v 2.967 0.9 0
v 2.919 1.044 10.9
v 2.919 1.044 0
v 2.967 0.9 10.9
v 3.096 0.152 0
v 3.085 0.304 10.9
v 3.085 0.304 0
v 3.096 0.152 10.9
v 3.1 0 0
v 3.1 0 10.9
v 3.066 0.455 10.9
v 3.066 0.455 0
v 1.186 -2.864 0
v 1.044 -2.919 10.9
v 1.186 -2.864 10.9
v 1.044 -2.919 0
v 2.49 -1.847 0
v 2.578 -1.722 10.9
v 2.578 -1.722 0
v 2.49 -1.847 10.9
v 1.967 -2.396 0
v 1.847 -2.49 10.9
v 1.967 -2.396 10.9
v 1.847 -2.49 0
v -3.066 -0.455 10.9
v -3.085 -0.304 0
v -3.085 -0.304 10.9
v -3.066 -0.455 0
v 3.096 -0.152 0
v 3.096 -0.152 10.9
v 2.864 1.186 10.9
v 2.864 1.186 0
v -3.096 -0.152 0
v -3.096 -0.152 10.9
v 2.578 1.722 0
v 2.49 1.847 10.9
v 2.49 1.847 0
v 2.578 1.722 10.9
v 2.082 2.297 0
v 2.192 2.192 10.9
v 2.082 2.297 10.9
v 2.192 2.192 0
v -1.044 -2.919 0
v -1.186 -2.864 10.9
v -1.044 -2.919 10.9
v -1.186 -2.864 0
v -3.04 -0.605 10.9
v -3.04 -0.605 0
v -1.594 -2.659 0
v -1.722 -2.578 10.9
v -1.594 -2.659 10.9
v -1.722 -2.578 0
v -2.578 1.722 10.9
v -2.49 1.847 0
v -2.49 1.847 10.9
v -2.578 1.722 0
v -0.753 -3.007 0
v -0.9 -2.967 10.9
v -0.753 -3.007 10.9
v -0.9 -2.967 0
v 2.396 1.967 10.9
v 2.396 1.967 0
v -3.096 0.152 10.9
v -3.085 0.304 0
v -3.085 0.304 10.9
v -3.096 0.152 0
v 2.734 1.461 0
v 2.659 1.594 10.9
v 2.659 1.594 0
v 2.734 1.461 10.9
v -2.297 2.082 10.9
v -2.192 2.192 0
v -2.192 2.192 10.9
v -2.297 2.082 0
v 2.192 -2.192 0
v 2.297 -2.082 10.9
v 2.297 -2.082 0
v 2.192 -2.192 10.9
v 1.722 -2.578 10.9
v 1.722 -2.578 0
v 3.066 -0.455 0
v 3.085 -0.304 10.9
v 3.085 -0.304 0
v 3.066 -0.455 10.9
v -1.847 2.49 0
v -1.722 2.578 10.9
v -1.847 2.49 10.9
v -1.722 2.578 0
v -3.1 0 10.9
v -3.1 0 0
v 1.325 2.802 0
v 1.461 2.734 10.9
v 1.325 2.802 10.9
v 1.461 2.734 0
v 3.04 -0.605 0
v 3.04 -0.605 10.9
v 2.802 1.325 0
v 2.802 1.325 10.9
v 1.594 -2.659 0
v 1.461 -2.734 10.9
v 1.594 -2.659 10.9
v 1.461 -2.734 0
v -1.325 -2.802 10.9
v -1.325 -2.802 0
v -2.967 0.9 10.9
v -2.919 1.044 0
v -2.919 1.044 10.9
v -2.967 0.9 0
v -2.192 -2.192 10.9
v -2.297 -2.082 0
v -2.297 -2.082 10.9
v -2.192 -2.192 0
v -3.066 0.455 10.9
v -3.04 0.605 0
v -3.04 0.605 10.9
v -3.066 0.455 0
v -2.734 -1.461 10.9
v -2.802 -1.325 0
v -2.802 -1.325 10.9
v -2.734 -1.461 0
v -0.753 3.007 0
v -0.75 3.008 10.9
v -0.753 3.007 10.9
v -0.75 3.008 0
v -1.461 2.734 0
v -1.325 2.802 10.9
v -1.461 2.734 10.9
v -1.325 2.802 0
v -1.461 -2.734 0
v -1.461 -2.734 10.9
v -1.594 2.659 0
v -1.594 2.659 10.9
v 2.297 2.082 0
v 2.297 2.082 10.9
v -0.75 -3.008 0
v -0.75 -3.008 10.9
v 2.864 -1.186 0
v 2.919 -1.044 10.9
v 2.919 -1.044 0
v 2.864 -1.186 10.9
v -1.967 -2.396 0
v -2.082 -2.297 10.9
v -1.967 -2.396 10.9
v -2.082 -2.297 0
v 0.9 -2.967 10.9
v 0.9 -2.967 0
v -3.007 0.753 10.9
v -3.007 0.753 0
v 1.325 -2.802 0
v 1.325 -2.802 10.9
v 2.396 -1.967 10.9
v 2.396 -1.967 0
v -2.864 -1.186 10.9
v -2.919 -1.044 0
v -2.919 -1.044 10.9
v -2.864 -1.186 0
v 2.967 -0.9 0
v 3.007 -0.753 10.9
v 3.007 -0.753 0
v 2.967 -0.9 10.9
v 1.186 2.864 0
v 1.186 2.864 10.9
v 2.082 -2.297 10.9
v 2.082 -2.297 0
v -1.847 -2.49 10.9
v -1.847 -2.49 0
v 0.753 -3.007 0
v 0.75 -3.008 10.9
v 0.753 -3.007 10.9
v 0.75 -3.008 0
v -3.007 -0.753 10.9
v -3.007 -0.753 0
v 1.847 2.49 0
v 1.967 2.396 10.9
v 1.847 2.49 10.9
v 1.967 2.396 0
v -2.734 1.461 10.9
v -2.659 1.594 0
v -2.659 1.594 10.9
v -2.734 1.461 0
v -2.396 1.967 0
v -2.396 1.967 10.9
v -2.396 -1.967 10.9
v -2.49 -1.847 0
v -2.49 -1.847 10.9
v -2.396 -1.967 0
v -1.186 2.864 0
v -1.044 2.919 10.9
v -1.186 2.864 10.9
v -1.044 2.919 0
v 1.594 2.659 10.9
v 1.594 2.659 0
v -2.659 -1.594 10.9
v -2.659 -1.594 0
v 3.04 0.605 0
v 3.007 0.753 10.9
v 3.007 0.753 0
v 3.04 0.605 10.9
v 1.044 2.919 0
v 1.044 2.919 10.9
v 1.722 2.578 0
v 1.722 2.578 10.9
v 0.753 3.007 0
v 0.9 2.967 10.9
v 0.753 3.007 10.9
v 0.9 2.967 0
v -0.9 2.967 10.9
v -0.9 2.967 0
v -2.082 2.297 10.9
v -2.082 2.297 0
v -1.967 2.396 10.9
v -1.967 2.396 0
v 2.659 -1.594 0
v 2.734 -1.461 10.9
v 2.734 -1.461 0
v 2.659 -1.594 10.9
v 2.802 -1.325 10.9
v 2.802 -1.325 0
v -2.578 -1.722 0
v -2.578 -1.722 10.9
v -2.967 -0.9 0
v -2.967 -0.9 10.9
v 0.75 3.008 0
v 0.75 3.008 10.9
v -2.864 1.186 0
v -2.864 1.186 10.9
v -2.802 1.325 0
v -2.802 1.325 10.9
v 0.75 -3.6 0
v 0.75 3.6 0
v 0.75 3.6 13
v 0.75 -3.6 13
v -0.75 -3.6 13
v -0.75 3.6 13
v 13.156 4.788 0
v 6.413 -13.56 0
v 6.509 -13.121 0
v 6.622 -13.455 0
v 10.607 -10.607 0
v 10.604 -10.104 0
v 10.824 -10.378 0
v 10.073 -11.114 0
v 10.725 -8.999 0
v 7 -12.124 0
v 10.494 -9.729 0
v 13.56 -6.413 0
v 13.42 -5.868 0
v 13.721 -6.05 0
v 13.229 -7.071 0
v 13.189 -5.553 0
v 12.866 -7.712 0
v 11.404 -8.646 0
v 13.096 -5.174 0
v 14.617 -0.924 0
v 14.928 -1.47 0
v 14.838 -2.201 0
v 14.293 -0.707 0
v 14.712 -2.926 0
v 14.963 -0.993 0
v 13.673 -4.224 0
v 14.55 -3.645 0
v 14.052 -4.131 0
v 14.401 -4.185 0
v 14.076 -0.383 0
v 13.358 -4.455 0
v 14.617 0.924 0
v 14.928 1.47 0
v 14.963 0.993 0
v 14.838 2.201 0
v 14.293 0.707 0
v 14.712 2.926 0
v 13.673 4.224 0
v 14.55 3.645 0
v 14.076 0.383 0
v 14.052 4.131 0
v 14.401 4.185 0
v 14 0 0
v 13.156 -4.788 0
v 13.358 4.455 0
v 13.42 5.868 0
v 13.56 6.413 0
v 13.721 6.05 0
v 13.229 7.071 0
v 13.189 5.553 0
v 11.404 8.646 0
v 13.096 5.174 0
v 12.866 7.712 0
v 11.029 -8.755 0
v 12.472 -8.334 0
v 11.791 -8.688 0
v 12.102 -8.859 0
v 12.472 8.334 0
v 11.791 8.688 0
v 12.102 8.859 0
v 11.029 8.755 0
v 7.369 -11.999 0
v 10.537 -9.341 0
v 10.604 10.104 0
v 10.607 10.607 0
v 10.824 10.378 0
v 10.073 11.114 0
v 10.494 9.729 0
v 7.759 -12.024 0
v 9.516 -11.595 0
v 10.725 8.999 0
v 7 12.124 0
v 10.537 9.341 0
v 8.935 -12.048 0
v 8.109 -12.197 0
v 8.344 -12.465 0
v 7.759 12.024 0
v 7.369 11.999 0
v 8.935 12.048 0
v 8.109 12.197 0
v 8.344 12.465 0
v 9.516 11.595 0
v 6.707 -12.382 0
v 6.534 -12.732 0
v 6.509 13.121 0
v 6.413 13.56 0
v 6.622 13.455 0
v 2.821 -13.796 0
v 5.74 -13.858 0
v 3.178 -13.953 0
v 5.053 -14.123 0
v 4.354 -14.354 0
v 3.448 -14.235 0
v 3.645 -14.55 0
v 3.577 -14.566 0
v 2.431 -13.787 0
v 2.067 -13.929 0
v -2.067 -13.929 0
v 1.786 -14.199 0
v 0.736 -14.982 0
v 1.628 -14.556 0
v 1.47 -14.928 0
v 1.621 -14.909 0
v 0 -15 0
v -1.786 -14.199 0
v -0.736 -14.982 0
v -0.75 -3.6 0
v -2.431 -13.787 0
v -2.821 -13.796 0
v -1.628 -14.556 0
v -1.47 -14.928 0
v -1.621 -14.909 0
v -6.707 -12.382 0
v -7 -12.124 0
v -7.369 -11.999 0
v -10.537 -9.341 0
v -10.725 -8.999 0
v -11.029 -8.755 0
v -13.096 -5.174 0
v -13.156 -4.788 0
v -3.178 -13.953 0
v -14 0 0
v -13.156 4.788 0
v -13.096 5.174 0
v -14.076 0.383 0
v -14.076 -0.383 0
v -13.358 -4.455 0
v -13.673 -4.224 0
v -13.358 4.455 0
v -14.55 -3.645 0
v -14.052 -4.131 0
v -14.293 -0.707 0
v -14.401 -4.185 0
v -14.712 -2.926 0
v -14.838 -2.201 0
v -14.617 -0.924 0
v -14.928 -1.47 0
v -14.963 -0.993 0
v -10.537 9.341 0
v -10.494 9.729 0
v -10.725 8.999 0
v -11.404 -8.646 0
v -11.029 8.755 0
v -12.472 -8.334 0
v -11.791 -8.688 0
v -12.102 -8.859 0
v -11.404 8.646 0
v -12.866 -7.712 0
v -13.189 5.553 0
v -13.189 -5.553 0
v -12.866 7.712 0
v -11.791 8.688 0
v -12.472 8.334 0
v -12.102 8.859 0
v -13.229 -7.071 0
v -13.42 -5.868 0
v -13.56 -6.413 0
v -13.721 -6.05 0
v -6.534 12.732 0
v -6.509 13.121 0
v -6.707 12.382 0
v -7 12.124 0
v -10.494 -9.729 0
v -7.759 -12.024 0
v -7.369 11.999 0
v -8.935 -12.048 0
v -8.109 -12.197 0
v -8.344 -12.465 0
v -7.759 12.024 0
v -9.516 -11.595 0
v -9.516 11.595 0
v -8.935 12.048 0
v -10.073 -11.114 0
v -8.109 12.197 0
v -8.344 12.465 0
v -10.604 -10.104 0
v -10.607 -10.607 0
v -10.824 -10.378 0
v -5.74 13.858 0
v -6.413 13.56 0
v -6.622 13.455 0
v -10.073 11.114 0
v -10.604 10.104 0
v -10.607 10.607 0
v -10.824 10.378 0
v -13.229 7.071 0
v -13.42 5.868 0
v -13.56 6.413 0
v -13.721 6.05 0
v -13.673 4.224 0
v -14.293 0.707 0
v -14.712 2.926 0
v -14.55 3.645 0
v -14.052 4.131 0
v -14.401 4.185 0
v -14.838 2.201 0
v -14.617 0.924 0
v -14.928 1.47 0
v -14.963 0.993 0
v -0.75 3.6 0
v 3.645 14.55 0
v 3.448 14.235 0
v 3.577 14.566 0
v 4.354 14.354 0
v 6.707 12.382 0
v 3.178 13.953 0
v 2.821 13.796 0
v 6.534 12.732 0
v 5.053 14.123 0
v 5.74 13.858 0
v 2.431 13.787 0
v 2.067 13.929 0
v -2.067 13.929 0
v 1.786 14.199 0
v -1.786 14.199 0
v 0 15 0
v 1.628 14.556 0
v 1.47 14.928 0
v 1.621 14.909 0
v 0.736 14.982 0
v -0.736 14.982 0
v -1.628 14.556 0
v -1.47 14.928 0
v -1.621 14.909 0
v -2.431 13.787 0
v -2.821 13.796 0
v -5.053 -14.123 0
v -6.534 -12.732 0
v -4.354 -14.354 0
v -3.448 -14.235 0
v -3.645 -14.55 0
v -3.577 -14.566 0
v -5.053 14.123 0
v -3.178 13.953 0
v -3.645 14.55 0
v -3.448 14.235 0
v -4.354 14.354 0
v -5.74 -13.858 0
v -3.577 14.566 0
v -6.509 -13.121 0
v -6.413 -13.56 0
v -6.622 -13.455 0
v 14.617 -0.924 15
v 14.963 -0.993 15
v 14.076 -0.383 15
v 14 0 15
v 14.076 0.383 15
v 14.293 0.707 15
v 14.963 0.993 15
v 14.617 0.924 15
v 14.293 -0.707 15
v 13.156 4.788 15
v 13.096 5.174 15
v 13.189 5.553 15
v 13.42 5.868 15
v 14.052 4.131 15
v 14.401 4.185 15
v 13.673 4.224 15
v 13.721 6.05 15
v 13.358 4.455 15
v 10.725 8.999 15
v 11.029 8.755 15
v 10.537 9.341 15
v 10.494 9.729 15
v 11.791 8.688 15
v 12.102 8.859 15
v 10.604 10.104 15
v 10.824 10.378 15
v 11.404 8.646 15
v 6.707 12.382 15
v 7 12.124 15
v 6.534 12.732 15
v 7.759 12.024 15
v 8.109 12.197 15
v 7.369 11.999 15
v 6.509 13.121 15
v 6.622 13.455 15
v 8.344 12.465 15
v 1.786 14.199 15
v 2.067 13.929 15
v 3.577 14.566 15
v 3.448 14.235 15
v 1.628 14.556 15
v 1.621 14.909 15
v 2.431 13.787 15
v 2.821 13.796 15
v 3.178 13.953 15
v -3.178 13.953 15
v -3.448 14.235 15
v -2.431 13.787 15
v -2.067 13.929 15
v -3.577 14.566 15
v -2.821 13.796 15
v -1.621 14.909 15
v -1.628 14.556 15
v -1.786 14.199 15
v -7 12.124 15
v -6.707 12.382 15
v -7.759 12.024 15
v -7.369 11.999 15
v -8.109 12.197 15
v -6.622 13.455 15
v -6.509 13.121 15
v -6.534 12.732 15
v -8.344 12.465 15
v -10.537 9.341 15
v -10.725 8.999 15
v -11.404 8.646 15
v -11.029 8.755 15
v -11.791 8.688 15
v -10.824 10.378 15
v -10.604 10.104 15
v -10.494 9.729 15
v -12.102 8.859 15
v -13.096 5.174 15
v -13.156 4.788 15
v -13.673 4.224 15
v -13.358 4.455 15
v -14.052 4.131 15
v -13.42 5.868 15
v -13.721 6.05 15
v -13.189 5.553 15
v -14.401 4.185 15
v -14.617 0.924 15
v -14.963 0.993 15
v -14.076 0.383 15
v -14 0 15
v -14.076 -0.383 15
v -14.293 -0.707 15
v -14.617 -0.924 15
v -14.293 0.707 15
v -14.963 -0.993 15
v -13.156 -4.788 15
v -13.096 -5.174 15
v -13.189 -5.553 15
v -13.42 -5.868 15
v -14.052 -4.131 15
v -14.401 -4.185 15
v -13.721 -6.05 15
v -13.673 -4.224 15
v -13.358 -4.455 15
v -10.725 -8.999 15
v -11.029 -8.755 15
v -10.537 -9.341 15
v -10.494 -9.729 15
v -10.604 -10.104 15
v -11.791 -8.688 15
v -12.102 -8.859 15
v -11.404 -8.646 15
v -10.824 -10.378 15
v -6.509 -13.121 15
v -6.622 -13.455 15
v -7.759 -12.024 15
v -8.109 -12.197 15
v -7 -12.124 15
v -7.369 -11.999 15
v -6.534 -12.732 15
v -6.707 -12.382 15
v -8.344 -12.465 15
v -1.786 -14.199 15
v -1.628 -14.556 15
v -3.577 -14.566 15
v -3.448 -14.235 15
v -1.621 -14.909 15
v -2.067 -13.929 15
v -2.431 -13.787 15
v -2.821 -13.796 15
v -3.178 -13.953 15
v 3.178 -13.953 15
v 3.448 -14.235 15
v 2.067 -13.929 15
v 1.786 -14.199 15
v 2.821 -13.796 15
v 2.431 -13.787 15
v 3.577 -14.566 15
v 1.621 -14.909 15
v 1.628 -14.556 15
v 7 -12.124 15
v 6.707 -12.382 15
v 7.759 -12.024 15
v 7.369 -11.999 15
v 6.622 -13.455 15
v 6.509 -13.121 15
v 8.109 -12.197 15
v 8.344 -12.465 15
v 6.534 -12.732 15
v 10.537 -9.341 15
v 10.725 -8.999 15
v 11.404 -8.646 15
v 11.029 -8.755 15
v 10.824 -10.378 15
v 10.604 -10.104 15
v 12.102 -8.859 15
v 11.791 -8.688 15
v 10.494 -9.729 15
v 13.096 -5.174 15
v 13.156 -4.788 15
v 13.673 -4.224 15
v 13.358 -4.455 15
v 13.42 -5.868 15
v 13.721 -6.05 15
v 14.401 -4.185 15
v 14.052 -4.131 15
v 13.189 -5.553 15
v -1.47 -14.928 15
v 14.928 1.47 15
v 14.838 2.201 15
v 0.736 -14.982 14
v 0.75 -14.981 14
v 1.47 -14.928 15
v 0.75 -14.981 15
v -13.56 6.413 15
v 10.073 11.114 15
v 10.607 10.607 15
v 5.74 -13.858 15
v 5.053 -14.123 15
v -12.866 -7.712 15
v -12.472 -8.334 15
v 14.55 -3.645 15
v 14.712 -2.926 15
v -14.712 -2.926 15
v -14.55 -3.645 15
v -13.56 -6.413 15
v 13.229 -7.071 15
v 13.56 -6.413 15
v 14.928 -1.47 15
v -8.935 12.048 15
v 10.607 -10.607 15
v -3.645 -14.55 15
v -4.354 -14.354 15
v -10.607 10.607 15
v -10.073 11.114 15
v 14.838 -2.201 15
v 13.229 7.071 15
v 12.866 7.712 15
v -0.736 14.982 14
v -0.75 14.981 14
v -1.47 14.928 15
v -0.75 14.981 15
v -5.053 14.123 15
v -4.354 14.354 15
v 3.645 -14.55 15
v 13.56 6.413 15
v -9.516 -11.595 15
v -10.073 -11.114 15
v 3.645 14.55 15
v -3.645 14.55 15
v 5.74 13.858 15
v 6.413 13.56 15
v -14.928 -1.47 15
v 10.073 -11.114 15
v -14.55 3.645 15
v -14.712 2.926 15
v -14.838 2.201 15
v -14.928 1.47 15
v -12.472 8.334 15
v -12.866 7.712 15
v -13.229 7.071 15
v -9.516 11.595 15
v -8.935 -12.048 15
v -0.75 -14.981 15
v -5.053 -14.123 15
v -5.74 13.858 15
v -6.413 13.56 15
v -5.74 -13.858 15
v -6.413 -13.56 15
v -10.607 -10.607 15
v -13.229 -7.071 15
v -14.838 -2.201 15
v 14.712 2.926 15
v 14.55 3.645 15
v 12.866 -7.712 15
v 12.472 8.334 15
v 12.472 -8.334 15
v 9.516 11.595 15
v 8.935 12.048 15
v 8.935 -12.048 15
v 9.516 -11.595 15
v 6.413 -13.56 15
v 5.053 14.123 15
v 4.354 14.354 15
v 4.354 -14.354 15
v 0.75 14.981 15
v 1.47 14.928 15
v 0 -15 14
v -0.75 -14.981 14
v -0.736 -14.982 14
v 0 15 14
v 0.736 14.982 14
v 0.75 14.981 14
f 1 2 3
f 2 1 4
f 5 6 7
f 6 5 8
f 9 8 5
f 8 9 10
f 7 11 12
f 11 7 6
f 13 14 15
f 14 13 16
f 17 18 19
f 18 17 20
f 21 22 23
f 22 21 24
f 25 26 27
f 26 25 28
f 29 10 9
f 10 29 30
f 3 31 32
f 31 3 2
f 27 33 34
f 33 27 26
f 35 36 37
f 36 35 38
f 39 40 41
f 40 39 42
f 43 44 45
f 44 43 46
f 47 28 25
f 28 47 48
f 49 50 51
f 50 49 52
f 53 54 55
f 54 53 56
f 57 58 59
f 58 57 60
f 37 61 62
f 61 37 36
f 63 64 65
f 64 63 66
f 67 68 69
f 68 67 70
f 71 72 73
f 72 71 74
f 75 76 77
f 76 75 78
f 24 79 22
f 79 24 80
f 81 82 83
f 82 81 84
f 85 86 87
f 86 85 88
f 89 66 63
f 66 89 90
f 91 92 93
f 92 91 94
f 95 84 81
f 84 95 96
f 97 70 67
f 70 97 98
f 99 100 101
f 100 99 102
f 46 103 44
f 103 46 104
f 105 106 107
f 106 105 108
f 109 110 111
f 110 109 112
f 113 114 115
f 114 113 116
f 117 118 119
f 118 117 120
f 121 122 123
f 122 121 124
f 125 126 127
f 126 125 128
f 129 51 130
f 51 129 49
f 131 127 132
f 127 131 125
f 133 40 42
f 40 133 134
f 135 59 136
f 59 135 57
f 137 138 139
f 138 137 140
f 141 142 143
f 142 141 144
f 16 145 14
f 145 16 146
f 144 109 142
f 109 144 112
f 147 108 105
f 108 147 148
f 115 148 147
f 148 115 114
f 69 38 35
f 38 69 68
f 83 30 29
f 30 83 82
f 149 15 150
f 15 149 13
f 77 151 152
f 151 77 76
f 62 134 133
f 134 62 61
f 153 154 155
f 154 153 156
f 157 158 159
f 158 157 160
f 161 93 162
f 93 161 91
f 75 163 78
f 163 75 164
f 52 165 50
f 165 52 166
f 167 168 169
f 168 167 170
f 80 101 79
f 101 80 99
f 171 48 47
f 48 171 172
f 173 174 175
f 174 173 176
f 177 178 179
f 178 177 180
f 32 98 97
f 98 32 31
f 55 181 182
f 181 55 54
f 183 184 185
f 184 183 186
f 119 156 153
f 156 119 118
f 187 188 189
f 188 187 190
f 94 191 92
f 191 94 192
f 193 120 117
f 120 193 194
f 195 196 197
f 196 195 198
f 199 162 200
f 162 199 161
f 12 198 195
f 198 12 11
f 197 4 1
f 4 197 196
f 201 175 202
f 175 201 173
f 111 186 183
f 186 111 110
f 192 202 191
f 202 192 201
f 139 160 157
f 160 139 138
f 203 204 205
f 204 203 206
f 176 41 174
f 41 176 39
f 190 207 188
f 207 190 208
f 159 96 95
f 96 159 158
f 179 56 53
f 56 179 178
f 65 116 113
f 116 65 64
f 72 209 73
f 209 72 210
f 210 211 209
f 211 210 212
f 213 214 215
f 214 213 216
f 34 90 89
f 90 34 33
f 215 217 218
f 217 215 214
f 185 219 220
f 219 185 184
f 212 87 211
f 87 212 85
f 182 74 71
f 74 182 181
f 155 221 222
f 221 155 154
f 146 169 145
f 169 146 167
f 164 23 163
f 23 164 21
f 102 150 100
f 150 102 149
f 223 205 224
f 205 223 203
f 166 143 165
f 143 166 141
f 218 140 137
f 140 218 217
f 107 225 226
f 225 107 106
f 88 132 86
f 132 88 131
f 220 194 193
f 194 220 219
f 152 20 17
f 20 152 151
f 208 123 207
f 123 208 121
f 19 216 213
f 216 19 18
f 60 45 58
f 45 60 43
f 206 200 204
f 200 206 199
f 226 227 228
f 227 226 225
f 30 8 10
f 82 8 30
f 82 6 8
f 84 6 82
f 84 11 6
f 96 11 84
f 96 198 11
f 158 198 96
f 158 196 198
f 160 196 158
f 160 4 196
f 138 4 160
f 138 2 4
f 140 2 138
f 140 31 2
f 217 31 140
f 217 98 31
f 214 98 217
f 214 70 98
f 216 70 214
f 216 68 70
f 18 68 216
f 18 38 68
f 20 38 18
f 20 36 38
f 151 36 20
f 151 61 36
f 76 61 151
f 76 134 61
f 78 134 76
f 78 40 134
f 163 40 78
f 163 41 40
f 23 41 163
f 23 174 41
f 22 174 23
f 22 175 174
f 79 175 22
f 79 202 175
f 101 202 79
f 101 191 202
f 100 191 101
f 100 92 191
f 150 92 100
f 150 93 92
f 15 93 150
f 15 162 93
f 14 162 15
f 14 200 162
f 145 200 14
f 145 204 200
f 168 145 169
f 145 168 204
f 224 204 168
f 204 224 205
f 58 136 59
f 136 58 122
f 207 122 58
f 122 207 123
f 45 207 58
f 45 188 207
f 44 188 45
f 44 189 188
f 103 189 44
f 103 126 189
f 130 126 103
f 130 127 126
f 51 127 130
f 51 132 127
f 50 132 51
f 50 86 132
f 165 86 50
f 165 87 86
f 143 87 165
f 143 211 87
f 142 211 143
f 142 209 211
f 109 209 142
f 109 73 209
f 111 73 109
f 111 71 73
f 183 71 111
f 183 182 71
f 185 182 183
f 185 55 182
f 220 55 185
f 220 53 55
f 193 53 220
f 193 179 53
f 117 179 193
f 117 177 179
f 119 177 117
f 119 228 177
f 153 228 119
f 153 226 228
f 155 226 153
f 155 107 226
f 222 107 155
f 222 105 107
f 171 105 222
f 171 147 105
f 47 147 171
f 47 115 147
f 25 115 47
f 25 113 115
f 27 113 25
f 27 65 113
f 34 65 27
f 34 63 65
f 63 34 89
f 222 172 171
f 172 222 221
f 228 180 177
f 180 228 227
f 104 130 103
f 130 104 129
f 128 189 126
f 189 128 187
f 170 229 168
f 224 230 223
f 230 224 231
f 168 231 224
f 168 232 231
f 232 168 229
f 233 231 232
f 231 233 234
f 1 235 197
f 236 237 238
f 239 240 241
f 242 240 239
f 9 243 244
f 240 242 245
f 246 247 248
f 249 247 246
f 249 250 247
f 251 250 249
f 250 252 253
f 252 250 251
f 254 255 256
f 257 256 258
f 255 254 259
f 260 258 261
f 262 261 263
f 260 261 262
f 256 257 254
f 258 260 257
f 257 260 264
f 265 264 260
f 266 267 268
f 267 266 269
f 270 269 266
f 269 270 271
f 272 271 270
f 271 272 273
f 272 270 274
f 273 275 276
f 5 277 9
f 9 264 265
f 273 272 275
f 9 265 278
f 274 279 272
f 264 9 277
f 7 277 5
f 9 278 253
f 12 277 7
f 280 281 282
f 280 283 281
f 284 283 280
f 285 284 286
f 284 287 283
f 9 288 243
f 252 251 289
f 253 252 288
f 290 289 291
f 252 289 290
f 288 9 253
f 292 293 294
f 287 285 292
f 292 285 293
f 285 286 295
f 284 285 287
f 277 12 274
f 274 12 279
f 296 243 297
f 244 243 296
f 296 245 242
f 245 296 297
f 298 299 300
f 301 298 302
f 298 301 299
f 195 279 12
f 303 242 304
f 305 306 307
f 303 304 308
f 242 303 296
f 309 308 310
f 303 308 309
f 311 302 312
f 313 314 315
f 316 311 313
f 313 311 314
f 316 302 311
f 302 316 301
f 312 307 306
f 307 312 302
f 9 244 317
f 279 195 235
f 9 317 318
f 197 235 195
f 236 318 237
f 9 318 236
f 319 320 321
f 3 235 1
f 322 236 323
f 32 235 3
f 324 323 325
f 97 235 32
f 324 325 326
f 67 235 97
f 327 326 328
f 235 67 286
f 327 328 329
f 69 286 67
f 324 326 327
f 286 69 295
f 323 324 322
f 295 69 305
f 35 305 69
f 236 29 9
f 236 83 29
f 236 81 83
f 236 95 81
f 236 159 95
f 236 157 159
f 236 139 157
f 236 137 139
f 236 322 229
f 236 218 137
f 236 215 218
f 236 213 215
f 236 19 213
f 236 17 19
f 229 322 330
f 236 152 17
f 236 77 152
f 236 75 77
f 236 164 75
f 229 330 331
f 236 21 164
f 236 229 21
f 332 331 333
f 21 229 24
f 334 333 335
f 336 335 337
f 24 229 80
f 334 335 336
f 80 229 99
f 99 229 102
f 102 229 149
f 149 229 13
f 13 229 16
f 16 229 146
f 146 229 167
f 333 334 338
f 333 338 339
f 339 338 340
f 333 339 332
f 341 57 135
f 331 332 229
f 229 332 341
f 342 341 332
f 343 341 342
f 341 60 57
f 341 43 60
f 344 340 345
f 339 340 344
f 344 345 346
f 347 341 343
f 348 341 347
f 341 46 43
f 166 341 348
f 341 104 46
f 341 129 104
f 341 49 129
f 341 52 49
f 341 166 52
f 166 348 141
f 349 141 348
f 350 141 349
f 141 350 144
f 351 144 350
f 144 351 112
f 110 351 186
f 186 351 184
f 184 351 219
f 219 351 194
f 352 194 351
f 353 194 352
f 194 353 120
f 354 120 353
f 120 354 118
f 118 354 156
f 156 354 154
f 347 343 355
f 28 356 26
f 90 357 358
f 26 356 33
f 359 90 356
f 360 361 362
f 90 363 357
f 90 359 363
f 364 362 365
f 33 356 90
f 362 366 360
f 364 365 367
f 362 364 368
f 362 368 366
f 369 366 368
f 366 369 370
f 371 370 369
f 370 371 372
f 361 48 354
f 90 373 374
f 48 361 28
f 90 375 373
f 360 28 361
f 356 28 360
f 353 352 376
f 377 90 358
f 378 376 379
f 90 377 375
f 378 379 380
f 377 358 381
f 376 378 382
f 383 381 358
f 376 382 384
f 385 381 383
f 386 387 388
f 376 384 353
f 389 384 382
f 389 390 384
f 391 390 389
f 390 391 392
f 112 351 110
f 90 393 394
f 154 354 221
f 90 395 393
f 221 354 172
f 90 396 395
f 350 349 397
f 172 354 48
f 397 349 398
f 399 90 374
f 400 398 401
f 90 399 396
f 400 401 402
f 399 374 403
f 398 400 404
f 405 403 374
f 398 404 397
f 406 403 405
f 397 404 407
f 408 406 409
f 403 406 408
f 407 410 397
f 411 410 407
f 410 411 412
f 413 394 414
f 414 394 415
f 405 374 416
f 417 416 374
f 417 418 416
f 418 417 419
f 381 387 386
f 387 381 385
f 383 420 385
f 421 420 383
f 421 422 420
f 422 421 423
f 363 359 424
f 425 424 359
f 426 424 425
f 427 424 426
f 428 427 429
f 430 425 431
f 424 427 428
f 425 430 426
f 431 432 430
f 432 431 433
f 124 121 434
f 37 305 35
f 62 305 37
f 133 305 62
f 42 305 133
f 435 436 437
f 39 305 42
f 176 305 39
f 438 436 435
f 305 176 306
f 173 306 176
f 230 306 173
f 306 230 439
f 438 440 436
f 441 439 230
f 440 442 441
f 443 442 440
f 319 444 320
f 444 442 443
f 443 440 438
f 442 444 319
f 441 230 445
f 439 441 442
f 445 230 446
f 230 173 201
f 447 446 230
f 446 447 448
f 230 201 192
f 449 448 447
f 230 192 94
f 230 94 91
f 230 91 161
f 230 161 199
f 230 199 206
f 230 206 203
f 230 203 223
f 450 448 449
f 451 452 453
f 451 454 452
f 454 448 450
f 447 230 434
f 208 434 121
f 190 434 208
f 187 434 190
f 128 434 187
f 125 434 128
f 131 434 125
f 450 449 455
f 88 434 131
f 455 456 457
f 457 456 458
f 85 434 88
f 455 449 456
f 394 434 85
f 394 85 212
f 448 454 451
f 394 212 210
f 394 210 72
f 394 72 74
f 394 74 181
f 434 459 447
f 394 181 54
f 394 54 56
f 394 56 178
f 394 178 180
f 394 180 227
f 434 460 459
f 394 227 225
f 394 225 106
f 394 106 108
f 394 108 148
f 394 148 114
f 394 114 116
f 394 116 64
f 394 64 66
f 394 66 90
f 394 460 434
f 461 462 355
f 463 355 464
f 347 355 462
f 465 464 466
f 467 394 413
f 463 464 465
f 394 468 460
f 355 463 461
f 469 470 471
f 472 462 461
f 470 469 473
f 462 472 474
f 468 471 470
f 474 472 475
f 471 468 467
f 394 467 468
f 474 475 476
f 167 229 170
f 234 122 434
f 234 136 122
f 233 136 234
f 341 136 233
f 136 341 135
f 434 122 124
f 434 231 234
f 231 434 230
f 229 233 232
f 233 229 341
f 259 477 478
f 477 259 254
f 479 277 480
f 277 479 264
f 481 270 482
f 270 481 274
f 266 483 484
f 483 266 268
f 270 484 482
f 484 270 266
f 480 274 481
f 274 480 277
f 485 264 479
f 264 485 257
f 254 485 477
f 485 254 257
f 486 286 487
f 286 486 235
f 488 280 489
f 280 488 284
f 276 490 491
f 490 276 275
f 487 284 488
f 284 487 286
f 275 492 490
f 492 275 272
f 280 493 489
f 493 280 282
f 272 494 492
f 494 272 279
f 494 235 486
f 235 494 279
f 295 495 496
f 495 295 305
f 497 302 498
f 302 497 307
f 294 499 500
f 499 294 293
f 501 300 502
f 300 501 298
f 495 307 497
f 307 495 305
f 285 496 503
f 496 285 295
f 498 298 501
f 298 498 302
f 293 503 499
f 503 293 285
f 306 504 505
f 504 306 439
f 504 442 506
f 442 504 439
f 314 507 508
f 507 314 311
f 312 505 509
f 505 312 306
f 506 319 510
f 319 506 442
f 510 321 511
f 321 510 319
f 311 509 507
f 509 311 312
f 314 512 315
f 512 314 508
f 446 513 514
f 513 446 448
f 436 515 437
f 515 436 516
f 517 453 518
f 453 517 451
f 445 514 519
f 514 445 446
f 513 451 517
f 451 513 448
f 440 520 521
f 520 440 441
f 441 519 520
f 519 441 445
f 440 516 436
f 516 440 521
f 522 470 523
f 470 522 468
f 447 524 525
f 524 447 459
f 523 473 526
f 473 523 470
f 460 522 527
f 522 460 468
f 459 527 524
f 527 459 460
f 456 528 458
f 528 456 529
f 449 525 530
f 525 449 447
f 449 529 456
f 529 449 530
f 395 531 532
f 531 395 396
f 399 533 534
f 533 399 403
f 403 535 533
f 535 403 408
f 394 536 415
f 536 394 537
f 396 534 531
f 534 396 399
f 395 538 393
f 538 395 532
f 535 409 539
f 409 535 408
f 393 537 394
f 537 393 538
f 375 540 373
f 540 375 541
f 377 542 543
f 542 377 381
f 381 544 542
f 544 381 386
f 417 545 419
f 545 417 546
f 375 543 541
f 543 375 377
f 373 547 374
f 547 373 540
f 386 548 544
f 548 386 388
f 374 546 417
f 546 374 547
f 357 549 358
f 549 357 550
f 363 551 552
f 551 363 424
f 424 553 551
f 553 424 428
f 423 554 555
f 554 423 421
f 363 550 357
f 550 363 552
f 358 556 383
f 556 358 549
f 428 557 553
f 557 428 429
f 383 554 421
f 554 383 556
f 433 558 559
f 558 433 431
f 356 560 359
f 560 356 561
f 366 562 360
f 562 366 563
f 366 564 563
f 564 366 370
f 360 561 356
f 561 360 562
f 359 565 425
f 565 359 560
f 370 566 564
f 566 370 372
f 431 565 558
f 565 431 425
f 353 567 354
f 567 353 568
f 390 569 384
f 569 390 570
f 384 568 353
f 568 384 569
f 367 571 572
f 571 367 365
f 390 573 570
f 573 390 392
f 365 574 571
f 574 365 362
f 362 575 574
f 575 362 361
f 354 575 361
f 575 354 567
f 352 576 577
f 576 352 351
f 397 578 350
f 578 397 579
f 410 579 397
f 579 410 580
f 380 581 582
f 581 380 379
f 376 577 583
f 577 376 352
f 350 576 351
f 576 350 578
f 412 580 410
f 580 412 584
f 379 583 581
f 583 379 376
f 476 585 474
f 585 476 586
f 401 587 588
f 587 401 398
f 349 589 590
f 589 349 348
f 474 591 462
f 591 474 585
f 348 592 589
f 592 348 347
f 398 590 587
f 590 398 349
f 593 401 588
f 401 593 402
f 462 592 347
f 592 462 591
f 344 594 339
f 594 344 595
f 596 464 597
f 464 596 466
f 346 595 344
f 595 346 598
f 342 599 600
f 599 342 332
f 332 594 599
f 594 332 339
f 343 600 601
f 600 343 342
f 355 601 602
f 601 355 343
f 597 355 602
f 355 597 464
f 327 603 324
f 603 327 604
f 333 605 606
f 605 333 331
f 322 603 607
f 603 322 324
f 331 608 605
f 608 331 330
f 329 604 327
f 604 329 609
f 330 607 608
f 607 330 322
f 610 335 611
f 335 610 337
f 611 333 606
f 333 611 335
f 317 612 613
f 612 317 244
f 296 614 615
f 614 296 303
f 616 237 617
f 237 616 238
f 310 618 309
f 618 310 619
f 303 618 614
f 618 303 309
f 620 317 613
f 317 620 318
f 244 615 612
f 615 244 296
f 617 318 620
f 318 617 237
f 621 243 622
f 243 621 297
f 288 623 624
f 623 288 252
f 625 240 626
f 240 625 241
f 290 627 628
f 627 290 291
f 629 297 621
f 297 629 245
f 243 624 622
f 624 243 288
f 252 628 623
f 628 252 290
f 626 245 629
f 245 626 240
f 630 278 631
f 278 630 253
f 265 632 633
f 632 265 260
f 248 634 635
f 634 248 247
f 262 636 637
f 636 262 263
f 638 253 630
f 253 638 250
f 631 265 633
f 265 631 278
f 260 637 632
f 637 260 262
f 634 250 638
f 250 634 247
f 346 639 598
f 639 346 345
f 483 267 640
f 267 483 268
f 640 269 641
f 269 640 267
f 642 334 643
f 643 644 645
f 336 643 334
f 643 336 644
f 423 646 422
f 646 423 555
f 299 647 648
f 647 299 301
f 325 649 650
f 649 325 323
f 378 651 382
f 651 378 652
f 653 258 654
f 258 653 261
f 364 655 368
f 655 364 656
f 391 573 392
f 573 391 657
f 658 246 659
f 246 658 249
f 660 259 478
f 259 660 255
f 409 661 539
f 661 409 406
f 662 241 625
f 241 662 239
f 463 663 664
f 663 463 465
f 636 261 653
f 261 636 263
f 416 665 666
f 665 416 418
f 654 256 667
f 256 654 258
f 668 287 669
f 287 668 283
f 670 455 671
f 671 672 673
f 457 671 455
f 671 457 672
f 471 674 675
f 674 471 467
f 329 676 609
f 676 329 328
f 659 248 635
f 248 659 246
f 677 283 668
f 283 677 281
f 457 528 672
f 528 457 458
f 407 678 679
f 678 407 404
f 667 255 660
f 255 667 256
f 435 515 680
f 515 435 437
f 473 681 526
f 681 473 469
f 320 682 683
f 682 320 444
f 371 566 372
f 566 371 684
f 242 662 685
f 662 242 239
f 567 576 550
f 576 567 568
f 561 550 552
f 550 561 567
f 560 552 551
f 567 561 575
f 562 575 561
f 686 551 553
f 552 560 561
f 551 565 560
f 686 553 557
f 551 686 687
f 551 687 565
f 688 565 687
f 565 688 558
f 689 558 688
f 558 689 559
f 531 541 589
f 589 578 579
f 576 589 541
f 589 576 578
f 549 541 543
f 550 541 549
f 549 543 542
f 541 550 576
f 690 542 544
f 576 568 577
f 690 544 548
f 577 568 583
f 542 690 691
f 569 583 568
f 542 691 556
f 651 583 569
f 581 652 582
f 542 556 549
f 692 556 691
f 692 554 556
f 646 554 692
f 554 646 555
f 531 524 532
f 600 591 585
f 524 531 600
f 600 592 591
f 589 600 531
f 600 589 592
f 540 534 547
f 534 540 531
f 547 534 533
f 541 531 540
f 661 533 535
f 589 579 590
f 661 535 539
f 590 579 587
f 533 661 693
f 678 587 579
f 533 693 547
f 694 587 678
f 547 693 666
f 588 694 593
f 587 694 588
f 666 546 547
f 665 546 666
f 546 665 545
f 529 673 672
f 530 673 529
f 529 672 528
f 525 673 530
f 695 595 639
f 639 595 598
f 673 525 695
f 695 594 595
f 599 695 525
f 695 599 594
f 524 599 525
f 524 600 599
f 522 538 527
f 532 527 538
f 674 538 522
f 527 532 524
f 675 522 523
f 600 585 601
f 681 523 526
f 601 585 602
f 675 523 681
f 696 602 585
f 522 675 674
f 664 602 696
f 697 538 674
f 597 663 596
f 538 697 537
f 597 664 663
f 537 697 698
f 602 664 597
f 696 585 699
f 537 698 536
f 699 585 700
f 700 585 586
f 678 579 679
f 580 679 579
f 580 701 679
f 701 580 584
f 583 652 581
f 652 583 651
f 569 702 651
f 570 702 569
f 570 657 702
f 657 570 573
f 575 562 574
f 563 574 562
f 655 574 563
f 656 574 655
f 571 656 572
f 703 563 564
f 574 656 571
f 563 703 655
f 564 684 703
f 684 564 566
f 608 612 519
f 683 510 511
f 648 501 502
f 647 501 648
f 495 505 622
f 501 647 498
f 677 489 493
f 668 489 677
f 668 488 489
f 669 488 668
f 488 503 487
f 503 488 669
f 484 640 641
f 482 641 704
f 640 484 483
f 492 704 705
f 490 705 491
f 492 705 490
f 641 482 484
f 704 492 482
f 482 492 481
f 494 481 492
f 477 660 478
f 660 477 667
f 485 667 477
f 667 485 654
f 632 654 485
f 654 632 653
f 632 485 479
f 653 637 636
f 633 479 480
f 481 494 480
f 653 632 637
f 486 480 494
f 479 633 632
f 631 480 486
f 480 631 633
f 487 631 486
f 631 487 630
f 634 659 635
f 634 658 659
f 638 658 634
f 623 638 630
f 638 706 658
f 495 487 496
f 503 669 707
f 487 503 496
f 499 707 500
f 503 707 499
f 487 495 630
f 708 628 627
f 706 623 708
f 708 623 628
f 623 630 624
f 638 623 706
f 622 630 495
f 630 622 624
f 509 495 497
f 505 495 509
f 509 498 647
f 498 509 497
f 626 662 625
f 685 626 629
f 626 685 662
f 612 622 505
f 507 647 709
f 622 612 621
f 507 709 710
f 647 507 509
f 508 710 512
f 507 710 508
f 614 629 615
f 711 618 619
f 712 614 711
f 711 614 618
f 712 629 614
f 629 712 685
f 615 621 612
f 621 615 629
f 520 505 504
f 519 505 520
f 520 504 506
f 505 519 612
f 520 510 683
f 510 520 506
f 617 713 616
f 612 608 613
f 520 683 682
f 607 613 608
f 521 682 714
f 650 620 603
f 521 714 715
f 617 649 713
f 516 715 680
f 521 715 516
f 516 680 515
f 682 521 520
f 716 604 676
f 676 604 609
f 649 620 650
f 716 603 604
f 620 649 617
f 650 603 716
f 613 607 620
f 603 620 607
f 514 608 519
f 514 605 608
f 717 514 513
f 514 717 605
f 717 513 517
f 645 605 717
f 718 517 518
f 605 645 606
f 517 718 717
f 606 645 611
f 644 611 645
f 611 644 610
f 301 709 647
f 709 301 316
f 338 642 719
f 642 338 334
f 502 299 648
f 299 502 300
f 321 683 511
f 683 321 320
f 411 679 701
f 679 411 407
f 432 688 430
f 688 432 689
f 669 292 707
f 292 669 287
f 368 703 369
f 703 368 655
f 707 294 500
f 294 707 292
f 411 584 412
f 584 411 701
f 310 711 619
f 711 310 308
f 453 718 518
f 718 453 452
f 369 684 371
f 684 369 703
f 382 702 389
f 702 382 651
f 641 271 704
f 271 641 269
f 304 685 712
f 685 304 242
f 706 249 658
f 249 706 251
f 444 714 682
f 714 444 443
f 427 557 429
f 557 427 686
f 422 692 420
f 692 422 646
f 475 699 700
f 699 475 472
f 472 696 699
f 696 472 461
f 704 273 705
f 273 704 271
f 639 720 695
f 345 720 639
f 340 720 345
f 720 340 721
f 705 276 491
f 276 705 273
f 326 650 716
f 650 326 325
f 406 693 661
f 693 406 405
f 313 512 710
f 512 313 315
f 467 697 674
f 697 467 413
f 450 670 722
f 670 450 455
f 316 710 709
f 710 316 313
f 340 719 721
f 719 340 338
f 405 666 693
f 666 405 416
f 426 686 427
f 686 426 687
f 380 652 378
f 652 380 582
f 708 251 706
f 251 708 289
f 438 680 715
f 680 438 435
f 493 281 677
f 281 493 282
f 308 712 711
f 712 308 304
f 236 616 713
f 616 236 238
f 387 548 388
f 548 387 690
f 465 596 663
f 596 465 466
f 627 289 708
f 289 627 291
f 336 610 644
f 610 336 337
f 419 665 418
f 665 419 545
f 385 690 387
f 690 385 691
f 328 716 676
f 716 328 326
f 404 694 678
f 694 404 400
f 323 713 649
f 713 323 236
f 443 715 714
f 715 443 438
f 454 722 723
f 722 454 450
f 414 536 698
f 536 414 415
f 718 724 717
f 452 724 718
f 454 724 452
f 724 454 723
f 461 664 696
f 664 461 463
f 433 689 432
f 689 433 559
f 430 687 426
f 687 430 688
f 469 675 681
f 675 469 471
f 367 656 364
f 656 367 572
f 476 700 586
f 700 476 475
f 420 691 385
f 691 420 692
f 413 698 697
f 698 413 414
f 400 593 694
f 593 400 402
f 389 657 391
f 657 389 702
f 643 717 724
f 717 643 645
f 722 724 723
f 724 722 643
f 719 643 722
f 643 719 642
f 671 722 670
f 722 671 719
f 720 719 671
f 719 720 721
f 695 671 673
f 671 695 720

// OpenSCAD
// Replacement knob for a hotplate stirrer with a 6 mm D-shaft
// Print orientation: bottom face (with D-bore) on the bed at z = 0

// ---------------- Parameters ----------------
knob_d        = 30;    // knob outer diameter (mm)
knob_h        = 15;    // knob height (mm)

bore_d        = 6.2;   // D-bore circle diameter (mm)
bore_flat     = 4.7;   // distance from D-bore flat to opposite side (mm)
bore_depth    = 12;    // D-bore depth from bottom face (mm)

groove_count  = 18;    // number of vertical grip grooves
groove_d      = 2;     // grip groove diameter (mm)

pointer_w     = 1.5;   // pointer groove width (mm)
pointer_d     = 1;     // pointer groove depth (mm)

overcut       = 0.5;   // extra length for cutting shapes past faces (mm)

$fn = 128;             // curve resolution

// ---------------- Derived ----------------
bore_r = bore_d / 2;
bore_l = (bore_d - bore_flat) / 2;   // offset of flat from centre

// ---------------- Model ----------------
difference() {
    // Knob body
    cylinder(d = knob_d, h = knob_h);

    // D-shaped blind bore from bottom face
    translate([0, 0, overcut])
        union() {
            // Circle, shifted down so its bottom is at z = overcut
            translate([0, 0, -bore_r + overcut])
                cylinder(r = bore_r, h = bore_depth + 2 * overcut);
            // Flat cut on the bore (extends past top and bottom faces)
            translate([-bore_l, -bore_d / 2 - overcut, -overcut])
                cube([bore_d - bore_flat, bore_d + 2 * overcut,
                      bore_depth + 2 * overcut]);
        }

    // Vertical grip grooves around the outside, full height
    for (i = [0 : groove_count - 1])
        rotate([0, 0, i * 360 / groove_count])
            translate([knob_d / 2, 0, -overcut])
                cylinder(d = groove_d, h = knob_h + 2 * overcut, $fn = 16);

    // Pointer groove on top face, same side as the D-flat
    translate([-pointer_w / 2, -knob_d / 2, knob_h - pointer_d])
        cube([pointer_w, knob_d + pointer_w, pointer_d]);
}
